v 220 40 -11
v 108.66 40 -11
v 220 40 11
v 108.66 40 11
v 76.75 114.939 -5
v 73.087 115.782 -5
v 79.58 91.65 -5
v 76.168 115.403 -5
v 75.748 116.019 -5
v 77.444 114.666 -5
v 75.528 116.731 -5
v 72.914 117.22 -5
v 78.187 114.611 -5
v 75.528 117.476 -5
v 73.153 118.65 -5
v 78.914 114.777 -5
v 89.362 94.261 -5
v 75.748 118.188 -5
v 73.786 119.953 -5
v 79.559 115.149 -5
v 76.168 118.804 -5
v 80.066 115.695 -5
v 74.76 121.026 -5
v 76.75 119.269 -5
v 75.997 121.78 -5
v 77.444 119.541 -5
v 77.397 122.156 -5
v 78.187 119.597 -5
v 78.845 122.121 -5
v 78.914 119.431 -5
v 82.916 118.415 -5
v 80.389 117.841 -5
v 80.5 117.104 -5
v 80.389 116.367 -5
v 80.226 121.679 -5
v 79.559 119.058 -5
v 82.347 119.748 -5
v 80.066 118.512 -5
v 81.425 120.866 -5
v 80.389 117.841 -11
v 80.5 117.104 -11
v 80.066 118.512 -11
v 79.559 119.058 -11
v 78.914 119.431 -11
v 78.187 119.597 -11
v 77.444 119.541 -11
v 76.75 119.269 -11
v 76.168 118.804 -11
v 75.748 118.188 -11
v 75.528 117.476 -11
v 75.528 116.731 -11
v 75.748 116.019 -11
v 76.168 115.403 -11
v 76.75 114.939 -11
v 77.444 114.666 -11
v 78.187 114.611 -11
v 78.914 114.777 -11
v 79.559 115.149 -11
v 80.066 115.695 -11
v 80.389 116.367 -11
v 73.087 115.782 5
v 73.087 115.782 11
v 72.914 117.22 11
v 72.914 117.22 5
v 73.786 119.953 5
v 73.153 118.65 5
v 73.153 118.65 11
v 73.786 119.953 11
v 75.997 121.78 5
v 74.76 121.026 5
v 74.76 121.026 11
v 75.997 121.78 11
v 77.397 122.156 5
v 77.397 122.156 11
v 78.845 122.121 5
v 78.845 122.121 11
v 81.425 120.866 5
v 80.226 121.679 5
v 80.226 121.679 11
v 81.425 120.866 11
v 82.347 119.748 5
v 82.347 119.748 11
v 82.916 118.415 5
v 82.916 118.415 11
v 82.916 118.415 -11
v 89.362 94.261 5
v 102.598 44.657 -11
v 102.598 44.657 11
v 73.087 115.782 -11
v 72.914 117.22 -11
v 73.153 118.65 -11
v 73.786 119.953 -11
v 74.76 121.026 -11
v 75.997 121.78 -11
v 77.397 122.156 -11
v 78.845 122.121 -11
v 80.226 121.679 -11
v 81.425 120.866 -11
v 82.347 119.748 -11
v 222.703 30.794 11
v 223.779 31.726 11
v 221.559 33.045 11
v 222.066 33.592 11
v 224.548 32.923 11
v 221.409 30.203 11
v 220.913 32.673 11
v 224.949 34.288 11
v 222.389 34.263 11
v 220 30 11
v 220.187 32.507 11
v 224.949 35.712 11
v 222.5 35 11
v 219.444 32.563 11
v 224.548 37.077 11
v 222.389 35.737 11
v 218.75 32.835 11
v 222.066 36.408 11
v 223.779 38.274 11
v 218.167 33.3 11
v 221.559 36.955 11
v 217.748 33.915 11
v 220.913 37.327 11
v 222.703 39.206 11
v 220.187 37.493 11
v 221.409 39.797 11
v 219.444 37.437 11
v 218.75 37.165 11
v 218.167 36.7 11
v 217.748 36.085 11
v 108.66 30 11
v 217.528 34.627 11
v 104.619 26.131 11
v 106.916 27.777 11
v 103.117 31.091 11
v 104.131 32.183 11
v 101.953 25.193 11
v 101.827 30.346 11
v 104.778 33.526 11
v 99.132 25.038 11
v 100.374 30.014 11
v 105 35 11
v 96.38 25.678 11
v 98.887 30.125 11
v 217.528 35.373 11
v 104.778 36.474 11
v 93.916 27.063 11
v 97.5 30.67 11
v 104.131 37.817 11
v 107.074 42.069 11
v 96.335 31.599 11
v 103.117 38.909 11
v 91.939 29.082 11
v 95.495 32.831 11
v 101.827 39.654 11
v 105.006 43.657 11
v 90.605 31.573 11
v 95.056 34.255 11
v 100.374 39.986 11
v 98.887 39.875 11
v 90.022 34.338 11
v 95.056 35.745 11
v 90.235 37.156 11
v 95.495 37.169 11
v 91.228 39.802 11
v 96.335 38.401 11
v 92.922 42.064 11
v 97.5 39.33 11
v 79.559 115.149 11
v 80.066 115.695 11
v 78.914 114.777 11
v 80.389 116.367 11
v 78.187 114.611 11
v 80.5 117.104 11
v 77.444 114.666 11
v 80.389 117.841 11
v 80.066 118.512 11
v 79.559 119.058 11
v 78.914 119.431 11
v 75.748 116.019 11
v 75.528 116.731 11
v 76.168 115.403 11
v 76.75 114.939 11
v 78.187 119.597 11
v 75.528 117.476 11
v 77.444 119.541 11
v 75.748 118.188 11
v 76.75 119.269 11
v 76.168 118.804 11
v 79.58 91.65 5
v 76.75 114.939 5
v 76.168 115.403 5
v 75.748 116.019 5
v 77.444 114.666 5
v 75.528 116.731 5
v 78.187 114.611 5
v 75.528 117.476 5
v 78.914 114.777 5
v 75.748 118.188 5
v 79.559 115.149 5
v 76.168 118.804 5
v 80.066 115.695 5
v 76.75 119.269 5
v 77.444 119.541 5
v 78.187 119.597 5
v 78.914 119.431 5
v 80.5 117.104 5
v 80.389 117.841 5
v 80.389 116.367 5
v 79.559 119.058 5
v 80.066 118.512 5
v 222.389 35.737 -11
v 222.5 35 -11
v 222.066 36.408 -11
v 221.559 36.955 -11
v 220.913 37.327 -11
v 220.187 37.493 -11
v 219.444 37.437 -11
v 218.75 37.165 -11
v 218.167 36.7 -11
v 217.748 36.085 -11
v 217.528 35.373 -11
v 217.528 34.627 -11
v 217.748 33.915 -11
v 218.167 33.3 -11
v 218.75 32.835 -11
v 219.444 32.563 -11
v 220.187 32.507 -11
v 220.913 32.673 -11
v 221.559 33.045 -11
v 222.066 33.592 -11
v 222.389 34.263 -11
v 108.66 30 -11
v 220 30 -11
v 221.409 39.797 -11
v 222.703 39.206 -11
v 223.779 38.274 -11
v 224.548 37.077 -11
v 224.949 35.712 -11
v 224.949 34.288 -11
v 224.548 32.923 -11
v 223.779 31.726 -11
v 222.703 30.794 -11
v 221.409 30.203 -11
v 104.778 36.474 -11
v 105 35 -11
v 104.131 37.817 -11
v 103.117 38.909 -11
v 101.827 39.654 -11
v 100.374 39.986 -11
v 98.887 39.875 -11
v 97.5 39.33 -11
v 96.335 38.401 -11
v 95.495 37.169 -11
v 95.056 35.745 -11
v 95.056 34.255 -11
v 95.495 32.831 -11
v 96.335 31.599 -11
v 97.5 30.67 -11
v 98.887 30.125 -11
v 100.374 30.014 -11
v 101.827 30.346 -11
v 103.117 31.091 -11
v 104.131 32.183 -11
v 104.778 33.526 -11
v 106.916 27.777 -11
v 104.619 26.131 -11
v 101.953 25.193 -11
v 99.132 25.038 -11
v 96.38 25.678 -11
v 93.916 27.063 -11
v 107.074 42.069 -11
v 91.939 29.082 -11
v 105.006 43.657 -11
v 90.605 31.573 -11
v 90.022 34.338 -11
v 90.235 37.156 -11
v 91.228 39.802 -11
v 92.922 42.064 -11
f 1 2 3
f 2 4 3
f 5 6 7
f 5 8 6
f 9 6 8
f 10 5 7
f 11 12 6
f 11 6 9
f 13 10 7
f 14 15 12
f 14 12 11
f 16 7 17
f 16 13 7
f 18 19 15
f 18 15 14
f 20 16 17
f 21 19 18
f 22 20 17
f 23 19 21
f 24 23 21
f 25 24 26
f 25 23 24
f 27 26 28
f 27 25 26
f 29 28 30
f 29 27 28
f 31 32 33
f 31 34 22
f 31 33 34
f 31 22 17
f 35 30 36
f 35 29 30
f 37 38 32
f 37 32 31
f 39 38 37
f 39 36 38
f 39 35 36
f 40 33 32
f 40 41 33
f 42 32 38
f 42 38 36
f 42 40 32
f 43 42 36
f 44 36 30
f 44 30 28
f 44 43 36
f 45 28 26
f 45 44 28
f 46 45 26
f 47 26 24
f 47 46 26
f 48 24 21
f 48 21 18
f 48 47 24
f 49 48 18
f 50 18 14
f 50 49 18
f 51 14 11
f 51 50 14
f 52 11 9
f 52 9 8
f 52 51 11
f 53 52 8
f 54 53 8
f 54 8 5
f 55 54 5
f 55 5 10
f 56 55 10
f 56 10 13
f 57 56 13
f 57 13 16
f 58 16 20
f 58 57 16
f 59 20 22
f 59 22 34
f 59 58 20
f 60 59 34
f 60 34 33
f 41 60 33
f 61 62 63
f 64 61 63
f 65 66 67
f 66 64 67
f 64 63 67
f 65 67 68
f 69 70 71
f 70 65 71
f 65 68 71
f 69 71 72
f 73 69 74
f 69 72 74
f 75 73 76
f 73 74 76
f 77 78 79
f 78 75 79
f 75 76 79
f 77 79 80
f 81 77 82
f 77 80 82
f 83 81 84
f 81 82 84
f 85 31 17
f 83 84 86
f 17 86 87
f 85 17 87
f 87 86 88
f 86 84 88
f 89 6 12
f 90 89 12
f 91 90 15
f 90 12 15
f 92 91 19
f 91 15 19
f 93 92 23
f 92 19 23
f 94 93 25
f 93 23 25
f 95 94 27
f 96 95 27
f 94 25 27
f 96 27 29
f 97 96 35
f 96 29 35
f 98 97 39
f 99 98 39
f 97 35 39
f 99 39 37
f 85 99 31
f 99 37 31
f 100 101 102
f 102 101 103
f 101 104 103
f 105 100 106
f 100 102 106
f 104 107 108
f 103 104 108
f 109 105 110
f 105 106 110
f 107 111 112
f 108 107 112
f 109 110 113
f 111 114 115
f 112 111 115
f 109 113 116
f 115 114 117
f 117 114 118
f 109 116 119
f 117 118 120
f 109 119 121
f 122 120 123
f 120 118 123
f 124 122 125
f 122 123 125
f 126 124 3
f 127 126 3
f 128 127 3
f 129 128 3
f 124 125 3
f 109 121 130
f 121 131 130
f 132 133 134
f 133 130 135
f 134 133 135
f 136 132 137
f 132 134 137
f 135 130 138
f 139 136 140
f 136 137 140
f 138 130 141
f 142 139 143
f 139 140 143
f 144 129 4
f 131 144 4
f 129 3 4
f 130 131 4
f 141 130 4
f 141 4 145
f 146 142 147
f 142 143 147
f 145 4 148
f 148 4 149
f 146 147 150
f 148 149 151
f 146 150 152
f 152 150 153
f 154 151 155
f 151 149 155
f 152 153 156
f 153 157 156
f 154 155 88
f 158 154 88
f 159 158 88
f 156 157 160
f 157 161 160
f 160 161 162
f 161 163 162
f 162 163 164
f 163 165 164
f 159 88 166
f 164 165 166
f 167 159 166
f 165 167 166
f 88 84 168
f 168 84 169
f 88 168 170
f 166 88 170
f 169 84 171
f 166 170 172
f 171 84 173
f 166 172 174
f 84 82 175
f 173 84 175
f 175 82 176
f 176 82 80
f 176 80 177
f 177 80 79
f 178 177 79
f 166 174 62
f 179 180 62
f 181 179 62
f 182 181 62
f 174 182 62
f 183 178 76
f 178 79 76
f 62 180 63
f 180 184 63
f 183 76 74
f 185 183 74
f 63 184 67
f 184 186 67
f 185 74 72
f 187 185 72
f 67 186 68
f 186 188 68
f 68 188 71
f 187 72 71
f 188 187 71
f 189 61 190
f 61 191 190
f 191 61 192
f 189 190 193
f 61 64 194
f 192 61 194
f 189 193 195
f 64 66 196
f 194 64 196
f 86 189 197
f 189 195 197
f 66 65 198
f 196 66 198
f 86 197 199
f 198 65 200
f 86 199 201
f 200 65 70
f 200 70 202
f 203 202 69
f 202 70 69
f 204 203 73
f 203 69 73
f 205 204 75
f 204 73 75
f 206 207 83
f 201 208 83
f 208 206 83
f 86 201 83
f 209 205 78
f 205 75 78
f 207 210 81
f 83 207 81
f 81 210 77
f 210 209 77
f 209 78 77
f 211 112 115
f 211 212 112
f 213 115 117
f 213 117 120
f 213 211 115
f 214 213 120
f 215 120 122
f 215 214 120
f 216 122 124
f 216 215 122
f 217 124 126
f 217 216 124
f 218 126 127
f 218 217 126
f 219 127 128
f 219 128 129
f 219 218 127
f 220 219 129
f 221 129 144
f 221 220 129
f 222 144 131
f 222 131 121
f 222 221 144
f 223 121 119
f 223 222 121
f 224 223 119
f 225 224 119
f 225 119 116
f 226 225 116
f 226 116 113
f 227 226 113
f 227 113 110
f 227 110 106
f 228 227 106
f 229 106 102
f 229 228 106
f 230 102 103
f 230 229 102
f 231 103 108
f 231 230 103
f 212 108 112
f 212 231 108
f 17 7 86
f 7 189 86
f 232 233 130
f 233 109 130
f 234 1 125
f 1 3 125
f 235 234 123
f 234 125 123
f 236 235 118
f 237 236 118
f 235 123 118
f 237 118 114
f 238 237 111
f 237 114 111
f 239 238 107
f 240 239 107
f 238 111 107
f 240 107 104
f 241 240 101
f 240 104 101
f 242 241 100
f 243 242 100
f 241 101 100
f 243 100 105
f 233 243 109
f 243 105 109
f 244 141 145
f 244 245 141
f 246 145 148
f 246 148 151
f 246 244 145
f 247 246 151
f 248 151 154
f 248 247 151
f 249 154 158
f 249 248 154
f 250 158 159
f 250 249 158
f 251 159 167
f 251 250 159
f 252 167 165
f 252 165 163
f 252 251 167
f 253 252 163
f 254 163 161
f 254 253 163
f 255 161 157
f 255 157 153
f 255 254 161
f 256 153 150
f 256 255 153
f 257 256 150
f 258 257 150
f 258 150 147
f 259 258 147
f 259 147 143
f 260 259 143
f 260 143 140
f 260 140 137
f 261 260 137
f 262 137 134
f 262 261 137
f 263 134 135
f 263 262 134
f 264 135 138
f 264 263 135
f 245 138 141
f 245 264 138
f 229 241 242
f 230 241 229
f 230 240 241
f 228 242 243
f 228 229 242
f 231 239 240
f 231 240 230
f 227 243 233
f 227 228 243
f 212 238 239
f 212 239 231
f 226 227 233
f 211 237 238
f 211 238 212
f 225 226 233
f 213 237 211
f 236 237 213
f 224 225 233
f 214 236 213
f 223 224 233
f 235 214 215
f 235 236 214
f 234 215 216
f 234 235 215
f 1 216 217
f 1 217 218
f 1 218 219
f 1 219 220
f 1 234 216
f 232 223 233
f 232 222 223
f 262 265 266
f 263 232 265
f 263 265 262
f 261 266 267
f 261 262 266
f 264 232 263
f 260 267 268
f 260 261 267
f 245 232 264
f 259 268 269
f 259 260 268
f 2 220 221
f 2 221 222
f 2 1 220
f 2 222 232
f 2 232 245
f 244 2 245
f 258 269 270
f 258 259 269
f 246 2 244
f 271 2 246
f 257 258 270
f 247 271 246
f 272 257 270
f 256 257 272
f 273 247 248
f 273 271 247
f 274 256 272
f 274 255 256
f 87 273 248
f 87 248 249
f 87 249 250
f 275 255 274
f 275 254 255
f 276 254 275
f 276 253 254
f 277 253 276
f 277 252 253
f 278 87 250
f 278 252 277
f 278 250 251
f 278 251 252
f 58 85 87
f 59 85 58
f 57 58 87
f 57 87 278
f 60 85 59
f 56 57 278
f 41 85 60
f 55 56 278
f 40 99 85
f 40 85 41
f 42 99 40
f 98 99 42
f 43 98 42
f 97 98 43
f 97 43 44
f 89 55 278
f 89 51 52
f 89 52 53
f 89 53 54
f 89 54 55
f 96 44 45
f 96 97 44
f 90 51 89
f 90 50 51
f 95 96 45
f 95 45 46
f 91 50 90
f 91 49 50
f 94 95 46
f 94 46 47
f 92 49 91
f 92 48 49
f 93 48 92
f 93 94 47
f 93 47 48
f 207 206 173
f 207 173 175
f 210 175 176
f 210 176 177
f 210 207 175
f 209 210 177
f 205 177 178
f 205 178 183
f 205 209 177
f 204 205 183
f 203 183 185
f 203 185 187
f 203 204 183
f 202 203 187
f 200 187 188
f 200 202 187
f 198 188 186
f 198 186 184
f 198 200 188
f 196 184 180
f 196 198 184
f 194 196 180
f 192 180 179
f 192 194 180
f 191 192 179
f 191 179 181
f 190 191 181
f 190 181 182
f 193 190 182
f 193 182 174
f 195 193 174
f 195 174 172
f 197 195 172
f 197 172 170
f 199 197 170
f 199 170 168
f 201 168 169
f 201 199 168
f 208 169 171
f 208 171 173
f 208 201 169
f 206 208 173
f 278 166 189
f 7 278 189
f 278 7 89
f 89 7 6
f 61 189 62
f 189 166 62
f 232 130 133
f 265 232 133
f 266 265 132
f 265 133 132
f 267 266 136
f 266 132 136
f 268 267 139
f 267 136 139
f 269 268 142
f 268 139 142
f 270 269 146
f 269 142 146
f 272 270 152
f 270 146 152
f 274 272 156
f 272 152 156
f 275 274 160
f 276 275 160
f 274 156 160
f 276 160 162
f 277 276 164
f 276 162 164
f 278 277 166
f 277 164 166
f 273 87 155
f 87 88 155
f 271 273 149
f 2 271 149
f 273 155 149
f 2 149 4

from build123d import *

# Parameters (mm, degrees)
SKETCH_1_R          = 2.5
SKETCH_1_R_2        = 5
EXTRUDE_1_DEPTH     = 11
SKETCH_1_2_R        = 5
SKETCH_1_2_R_2      = 2.5
EXTRUDE_2_DEPTH     = 11
SKETCH_3_R          = 2.5
CUT_EXTRUDE_1_DEPTH = 5


with BuildPart() as part:
    # 草图1 → 凸台-拉伸1 (new, symmetric)
    with BuildSketch(Plane.XY):
        with BuildLine():
            Line((82.916122479, 118.415426808), (102.598160303, 44.656581333))
            ThreePointArc((102.598160303, 44.656581333), (106.091708364, 42.93039023), (108.660254038, 40))
            Line((108.660254038, 40), (220, 40))
            ThreePointArc((220, 40), (225, 35), (220, 30))
            Line((220, 30), (108.660254038, 30))
            ThreePointArc((108.660254038, 30), (93.916481406, 27.063325538), (92.921636508, 42.063764596))
            Line((92.921636508, 42.063764596), (73.087358524, 115.781817444))
            ThreePointArc((73.087358524, 115.781817444), (76.683575783, 122.01807983), (82.916122479, 118.415426808))
        make_face()
        with Locations((78.000381166, 117.103695235)):
            Circle(SKETCH_1_R, mode=Mode.SUBTRACT)
        with Locations((220, 35)):
            Circle(SKETCH_1_R, mode=Mode.SUBTRACT)
        with Locations((100, 35)):
            Circle(SKETCH_1_R_2, mode=Mode.SUBTRACT)
    extrude(amount=EXTRUDE_1_DEPTH, both=True)

    # 草图1<2> → 凸台-拉伸2 (add, symmetric)
    with BuildSketch(Plane.XY):
        with BuildLine():
            Line((102.598160303, 44.656581333), (82.916122479, 118.415426808))
            ThreePointArc((82.916122479, 118.415426808), (76.683575783, 122.01807983), (73.087358524, 115.781817444))
            Line((73.087358524, 115.781817444), (92.921636508, 42.063764596))
            ThreePointArc((92.921636508, 42.063764596), (93.916481406, 27.063325538), (108.660254038, 30))
            Line((108.660254038, 30), (220, 30))
            ThreePointArc((220, 30), (225, 35), (220, 40))
            Line((220, 40), (108.660254038, 40))
            ThreePointArc((108.660254038, 40), (106.091708364, 42.93039023), (102.598160303, 44.656581333))
        make_face()
        with Locations((100, 35)):
            Circle(SKETCH_1_2_R, mode=Mode.SUBTRACT)
        with Locations((220, 35)):
            Circle(SKETCH_1_2_R_2, mode=Mode.SUBTRACT)
        with Locations((78.000381166, 117.103695235)):
            Circle(SKETCH_1_2_R_2, mode=Mode.SUBTRACT)
    extrude(amount=EXTRUDE_2_DEPTH, both=True)

    # 草图3 → 切除-拉伸1 (cut, symmetric)
    with BuildSketch(Plane.XY):
        with BuildLine():
            Line((89.361667081, 94.260614559), (82.916122479, 118.415426808))
            ThreePointArc((82.916122479, 118.415426808), (76.683575783, 122.01807983), (73.087358524, 115.781817444))
            Line((73.087358524, 115.781817444), (79.580043978, 91.650456081))
            Line((79.580043978, 91.650456081), (89.361667081, 94.260614559))
        make_face()
        with Locations((78.000381166, 117.103695235)):
            Circle(SKETCH_3_R, mode=Mode.SUBTRACT)
    extrude(amount=CUT_EXTRUDE_1_DEPTH, both=True, mode=Mode.SUBTRACT)


solid = part.part
